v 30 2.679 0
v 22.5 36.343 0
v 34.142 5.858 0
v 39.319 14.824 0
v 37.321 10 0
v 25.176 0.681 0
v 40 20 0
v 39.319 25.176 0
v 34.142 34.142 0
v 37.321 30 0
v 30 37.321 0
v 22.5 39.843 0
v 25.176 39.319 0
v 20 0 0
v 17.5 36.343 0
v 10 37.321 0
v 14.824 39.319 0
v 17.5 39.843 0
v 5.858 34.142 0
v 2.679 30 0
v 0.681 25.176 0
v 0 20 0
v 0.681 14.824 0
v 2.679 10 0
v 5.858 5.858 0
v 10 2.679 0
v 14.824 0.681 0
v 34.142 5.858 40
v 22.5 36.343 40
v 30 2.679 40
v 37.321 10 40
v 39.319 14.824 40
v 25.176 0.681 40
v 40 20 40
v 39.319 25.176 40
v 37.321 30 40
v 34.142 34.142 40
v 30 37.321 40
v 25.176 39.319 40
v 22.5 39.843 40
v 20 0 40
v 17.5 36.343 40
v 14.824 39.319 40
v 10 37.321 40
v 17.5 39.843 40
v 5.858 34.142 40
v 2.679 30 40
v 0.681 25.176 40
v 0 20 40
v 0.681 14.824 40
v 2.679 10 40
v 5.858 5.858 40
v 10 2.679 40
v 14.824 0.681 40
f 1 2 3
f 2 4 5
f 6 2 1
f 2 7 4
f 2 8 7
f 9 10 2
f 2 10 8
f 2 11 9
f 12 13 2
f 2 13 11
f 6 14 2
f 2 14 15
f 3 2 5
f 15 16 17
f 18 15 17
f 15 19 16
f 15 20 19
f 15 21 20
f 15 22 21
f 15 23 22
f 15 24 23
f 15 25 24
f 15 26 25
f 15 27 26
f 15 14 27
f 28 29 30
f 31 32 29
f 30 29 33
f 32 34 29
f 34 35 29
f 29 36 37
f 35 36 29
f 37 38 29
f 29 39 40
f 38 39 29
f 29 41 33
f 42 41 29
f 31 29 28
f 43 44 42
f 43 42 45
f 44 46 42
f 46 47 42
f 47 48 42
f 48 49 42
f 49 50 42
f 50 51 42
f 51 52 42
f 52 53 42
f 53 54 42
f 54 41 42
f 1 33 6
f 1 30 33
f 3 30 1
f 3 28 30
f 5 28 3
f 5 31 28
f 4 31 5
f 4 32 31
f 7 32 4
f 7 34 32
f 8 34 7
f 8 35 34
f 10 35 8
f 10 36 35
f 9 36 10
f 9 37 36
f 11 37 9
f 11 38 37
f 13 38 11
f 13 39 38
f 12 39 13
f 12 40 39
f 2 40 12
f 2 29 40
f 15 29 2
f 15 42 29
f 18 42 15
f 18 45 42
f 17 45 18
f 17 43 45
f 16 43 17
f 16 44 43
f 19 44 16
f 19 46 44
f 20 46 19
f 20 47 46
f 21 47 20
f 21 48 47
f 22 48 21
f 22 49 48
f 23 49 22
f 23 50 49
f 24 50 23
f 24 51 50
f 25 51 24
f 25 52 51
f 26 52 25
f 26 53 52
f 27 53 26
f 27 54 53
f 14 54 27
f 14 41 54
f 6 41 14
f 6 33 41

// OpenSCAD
$fn = 32;

// ----------------------------------------------------------------------
// Keyway shaft: d40 shaft, key 5 x 3.5 mm
// ----------------------------------------------------------------------

// --- parameters (mm) ---
shaft_r = 20;             // shaft radius
key_w = 5;                // keyway width
key_d = 3.5;              // keyway depth below the surface line
plate_t = 40;             // shaft length, Z (extrusion height)

shaft_d = 2 * shaft_r;  // shaft diameter
circle_step = 15;  // polygon sampling step, degrees

profile = [[14.824, 39.319], [10, 37.321], [5.858, 34.142], [2.679, 30], [0.681, 25.176], [0, 20], [0.681, 14.824], [2.679, 10], [5.858, 5.858], [10, 2.679], [14.824, 0.681], [20, 0], [25.176, 0.681], [30, 2.679], [34.142, 5.858], [37.321, 10], [39.319, 14.824], [40, 20], [39.319, 25.176], [37.321, 30], [34.142, 34.142], [30, 37.321], [25.176, 39.319], [22.5, 39.843], [22.5, 36.343], [17.5, 36.343], [17.5, 39.843]];  // primary outline, 27 points, counter clockwise

// --- the one profile operation ---
linear_extrude(height = plate_t) polygon(points = profile);
